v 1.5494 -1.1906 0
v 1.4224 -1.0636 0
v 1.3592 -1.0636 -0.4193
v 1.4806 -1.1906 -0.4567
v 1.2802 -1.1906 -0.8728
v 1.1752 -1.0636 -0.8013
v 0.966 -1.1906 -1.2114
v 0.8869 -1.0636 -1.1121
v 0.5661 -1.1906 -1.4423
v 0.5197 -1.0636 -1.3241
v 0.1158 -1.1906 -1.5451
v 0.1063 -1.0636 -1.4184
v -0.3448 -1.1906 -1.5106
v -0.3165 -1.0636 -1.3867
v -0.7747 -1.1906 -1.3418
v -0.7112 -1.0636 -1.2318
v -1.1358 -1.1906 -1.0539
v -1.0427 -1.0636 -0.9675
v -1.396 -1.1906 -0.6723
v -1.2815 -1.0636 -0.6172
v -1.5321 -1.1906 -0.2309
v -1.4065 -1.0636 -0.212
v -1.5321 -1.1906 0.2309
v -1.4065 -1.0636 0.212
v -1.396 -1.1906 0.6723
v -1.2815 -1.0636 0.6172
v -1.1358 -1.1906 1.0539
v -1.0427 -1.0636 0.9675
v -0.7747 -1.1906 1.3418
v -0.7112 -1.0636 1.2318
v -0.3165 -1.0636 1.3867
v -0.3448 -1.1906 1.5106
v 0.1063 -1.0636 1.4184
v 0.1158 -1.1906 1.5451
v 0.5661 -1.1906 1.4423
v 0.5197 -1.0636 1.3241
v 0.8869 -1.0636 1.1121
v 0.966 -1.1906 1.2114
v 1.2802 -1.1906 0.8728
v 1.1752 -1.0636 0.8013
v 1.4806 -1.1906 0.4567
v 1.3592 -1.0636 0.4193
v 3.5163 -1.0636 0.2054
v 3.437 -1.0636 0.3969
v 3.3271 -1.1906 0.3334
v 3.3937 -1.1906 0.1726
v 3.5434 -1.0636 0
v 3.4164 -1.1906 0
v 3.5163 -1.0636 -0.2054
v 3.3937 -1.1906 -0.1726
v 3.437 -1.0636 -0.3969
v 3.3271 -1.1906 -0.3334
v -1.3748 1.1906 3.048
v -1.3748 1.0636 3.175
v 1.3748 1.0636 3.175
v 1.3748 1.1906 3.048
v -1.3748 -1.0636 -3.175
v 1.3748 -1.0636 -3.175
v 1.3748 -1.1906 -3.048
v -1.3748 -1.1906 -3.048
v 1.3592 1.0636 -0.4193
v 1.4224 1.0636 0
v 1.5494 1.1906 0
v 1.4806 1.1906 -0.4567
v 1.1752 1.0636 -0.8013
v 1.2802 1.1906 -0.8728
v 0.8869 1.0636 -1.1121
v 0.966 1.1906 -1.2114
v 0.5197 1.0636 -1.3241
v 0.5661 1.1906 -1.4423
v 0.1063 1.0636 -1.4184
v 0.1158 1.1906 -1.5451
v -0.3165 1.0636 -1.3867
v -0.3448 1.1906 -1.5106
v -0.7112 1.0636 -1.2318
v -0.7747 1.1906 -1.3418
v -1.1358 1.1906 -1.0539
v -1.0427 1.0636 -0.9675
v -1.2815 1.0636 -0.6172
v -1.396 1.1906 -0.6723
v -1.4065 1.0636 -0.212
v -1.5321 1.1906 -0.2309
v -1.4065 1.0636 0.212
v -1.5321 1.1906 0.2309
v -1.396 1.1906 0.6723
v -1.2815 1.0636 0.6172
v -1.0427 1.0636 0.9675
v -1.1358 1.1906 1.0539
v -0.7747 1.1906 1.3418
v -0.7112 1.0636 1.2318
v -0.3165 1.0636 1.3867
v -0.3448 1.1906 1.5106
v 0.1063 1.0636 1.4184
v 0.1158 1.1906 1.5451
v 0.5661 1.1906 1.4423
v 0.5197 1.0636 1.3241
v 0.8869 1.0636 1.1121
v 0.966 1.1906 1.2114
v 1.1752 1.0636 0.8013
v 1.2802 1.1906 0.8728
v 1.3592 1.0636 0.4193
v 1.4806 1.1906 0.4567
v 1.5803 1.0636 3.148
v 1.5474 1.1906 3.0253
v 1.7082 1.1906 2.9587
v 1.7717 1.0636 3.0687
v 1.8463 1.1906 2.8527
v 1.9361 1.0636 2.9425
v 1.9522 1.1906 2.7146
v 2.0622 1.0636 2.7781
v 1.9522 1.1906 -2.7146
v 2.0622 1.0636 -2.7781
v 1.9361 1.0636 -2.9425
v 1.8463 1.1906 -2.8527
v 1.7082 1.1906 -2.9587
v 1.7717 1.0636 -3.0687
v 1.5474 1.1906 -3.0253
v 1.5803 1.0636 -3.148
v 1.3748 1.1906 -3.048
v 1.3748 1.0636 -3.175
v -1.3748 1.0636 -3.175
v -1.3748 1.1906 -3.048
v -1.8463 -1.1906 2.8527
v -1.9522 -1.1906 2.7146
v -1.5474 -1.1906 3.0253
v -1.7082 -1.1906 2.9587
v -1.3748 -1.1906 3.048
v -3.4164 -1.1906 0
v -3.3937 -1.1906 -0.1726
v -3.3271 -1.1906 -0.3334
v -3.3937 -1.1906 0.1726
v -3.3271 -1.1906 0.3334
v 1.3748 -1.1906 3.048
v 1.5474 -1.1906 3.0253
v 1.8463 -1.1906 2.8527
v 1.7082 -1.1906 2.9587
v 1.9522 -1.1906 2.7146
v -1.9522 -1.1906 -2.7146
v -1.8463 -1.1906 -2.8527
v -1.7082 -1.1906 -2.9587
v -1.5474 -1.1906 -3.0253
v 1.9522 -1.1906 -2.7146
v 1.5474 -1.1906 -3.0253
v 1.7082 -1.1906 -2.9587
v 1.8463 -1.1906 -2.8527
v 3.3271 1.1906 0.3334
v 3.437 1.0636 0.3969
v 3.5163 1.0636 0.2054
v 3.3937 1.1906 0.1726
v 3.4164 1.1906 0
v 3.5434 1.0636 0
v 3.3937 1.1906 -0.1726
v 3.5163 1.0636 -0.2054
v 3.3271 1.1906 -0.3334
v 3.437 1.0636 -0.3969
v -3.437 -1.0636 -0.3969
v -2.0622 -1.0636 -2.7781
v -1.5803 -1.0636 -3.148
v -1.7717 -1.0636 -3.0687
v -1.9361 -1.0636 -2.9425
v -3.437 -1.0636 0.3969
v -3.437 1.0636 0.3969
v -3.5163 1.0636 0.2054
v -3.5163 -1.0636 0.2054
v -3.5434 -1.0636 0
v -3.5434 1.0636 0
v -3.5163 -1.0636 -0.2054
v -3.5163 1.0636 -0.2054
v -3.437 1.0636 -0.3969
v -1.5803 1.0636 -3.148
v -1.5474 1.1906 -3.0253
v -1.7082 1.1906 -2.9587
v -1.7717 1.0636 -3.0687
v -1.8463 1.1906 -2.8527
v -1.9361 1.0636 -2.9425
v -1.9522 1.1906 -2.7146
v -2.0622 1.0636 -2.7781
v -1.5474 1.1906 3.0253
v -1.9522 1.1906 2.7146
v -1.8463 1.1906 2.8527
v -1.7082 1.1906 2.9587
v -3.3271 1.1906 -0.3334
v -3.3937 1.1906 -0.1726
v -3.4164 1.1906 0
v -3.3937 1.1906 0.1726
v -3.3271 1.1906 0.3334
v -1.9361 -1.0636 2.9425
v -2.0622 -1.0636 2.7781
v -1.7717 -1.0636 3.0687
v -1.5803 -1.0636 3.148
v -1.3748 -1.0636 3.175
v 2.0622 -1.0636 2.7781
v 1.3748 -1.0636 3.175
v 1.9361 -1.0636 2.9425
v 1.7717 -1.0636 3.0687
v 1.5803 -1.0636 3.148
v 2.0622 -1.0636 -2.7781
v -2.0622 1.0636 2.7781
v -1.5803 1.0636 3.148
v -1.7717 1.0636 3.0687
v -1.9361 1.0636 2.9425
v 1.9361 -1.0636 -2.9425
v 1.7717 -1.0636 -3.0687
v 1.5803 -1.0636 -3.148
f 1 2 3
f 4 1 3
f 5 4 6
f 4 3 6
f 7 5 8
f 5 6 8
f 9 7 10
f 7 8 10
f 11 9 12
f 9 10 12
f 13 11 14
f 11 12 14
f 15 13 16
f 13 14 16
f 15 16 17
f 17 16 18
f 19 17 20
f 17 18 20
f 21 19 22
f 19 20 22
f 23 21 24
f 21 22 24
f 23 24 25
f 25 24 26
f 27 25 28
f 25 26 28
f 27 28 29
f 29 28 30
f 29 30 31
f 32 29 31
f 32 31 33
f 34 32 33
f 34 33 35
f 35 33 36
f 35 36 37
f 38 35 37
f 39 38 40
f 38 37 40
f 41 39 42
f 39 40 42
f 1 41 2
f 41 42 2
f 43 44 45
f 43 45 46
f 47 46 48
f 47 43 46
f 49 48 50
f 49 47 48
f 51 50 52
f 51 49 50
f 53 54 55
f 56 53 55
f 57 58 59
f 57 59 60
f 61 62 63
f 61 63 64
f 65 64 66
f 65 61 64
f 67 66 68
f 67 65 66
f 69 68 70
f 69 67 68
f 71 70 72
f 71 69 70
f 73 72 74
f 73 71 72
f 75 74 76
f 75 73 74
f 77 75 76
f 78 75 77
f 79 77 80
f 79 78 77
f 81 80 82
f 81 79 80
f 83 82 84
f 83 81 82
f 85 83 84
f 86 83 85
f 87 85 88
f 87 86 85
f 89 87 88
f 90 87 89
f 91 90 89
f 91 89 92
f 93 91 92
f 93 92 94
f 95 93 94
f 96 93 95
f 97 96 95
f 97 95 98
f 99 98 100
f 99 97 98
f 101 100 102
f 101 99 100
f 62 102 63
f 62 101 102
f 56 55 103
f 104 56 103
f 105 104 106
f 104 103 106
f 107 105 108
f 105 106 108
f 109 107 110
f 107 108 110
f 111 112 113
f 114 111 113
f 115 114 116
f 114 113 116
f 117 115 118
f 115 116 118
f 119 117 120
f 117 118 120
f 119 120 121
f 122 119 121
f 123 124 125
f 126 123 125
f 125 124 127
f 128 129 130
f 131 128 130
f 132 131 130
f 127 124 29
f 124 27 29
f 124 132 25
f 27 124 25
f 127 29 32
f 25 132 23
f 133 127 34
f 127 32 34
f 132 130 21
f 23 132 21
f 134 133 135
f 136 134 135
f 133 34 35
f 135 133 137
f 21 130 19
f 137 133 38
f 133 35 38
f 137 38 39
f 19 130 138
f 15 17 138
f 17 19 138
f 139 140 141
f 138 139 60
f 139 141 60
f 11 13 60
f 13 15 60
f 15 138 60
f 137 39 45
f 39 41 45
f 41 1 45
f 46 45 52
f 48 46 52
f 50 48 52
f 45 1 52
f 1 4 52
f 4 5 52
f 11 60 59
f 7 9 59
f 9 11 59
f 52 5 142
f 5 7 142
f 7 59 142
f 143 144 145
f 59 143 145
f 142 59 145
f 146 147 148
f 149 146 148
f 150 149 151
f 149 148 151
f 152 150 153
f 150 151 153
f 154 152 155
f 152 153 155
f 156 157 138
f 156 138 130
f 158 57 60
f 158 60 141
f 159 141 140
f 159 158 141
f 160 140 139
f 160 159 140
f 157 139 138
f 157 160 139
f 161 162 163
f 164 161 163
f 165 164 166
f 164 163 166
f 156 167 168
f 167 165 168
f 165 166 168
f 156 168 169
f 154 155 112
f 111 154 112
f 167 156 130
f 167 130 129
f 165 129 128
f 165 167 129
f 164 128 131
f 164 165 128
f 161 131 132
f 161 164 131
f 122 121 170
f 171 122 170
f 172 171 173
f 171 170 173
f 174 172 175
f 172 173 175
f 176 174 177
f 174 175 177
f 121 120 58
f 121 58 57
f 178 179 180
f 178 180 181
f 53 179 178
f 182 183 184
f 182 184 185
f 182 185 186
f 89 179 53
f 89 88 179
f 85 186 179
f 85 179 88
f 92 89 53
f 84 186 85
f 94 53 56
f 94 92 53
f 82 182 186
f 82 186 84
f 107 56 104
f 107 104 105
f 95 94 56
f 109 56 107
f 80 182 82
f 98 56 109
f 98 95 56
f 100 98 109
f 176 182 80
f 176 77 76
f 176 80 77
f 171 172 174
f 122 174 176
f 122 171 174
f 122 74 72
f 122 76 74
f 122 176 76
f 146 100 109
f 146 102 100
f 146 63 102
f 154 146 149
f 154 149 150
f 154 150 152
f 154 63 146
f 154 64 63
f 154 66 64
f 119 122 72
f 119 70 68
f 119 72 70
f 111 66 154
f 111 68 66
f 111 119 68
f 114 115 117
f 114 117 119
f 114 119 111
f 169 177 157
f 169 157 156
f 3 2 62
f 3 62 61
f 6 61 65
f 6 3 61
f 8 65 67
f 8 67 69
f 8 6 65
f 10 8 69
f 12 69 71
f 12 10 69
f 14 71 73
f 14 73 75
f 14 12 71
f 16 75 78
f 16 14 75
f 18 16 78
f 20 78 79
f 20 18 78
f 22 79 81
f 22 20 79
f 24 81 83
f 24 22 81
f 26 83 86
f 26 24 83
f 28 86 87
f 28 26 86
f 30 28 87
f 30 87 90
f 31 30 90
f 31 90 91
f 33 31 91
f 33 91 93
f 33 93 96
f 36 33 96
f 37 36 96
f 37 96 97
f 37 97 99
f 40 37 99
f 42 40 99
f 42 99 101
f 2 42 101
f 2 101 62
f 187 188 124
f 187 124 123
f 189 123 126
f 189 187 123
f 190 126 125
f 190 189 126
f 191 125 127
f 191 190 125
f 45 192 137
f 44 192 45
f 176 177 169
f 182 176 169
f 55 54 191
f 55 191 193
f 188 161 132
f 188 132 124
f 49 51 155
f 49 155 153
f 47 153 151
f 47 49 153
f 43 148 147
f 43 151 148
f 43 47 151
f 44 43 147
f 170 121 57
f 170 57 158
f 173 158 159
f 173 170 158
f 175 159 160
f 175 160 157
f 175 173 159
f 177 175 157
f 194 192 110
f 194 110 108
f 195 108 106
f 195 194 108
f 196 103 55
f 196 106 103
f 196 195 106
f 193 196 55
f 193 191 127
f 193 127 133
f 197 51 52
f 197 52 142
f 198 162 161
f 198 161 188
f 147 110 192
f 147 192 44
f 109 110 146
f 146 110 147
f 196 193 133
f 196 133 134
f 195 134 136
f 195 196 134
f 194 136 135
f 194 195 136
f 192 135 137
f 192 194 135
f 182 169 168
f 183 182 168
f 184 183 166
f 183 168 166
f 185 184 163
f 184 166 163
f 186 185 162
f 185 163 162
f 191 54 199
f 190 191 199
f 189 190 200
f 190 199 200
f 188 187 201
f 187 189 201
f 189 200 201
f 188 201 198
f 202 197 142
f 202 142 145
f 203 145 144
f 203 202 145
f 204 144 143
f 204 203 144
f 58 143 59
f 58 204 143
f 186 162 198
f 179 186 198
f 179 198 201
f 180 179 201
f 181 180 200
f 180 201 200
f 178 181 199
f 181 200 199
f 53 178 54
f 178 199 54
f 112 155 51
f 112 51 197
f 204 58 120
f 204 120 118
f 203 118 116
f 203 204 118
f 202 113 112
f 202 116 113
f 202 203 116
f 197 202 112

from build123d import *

# Parameters (mm, degrees)
SKETCH3_R           = 1.4224
BOSS_EXTRUDE1_DEPTH = 1.190625
FILLET1_R           = 0.79375
CHAMFER1_SIZE       = 0.127


with BuildPart() as part:
    # Sketch3 → Boss-Extrude1 (new body, symmetric)
    with BuildSketch(Plane(origin=(0, 0, 0), x_dir=(1, 0, 0), z_dir=(0, 1, 0))):
        Polygon((1.833087105, 3.175), (-1.833087105, 3.175), (-3.666174209, 0), (-1.833087105, -3.175), (1.833087105, -3.175), (3.666174209, 0), align=None)
        Circle(SKETCH3_R, mode=Mode.SUBTRACT)
    extrude(amount=BOSS_EXTRUDE1_DEPTH, both=True)

    # Fillet1
    fillet1_edges = [part.edges().sort_by_distance(p)[0] for p in [
        (3.666174209, 0, 0),
        (1.833087105, 0, 3.175),
        (-1.833087105, 0, 3.175),
        (-3.666174209, 0, 0),
        (-1.833087105, 0, -3.175),
        (1.833087105, 0, -3.175),
    ]]
    fillet(fillet1_edges, radius=FILLET1_R)

    # Chamfer1
    chamfer1_edges = [part.edges().sort_by_distance(p)[0] for p in [
        (-1.4224, -1.190625, 0),
        (-1.4224, 1.190625, 0),
        (2.749630657, -1.190625, -1.5875),
        (2.749630657, 1.190625, -1.5875),
        (2.749630657, -1.190625, 1.5875),
        (0, -1.190625, 3.175),
        (-2.749630657, -1.190625, 1.5875),
        (-2.749630657, -1.190625, -1.5875),
        (0, -1.190625, -3.175),
        (-1.771690329, -1.190625, 3.068657664),
        (1.771690329, -1.190625, -3.068657664),
        (-1.771690329, -1.190625, -3.068657664),
        (-3.543380657, -1.190625, 0),
        (1.771690329, -1.190625, 3.068657664),
        (3.543380657, -1.190625, 0),
        (2.749630657, 1.190625, 1.5875),
        (0, 1.190625, -3.175),
        (-2.749630657, 1.190625, -1.5875),
        (-2.749630657, 1.190625, 1.5875),
        (0, 1.190625, 3.175),
        (-1.771690329, 1.190625, 3.068657664),
        (1.771690329, 1.190625, -3.068657664),
        (-1.771690329, 1.190625, -3.068657664),
        (-3.543380657, 1.190625, 0),
        (1.771690329, 1.190625, 3.068657664),
        (3.543380657, 1.190625, 0),
    ]]
    chamfer(chamfer1_edges, length=CHAMFER1_SIZE)


solid = part.part
